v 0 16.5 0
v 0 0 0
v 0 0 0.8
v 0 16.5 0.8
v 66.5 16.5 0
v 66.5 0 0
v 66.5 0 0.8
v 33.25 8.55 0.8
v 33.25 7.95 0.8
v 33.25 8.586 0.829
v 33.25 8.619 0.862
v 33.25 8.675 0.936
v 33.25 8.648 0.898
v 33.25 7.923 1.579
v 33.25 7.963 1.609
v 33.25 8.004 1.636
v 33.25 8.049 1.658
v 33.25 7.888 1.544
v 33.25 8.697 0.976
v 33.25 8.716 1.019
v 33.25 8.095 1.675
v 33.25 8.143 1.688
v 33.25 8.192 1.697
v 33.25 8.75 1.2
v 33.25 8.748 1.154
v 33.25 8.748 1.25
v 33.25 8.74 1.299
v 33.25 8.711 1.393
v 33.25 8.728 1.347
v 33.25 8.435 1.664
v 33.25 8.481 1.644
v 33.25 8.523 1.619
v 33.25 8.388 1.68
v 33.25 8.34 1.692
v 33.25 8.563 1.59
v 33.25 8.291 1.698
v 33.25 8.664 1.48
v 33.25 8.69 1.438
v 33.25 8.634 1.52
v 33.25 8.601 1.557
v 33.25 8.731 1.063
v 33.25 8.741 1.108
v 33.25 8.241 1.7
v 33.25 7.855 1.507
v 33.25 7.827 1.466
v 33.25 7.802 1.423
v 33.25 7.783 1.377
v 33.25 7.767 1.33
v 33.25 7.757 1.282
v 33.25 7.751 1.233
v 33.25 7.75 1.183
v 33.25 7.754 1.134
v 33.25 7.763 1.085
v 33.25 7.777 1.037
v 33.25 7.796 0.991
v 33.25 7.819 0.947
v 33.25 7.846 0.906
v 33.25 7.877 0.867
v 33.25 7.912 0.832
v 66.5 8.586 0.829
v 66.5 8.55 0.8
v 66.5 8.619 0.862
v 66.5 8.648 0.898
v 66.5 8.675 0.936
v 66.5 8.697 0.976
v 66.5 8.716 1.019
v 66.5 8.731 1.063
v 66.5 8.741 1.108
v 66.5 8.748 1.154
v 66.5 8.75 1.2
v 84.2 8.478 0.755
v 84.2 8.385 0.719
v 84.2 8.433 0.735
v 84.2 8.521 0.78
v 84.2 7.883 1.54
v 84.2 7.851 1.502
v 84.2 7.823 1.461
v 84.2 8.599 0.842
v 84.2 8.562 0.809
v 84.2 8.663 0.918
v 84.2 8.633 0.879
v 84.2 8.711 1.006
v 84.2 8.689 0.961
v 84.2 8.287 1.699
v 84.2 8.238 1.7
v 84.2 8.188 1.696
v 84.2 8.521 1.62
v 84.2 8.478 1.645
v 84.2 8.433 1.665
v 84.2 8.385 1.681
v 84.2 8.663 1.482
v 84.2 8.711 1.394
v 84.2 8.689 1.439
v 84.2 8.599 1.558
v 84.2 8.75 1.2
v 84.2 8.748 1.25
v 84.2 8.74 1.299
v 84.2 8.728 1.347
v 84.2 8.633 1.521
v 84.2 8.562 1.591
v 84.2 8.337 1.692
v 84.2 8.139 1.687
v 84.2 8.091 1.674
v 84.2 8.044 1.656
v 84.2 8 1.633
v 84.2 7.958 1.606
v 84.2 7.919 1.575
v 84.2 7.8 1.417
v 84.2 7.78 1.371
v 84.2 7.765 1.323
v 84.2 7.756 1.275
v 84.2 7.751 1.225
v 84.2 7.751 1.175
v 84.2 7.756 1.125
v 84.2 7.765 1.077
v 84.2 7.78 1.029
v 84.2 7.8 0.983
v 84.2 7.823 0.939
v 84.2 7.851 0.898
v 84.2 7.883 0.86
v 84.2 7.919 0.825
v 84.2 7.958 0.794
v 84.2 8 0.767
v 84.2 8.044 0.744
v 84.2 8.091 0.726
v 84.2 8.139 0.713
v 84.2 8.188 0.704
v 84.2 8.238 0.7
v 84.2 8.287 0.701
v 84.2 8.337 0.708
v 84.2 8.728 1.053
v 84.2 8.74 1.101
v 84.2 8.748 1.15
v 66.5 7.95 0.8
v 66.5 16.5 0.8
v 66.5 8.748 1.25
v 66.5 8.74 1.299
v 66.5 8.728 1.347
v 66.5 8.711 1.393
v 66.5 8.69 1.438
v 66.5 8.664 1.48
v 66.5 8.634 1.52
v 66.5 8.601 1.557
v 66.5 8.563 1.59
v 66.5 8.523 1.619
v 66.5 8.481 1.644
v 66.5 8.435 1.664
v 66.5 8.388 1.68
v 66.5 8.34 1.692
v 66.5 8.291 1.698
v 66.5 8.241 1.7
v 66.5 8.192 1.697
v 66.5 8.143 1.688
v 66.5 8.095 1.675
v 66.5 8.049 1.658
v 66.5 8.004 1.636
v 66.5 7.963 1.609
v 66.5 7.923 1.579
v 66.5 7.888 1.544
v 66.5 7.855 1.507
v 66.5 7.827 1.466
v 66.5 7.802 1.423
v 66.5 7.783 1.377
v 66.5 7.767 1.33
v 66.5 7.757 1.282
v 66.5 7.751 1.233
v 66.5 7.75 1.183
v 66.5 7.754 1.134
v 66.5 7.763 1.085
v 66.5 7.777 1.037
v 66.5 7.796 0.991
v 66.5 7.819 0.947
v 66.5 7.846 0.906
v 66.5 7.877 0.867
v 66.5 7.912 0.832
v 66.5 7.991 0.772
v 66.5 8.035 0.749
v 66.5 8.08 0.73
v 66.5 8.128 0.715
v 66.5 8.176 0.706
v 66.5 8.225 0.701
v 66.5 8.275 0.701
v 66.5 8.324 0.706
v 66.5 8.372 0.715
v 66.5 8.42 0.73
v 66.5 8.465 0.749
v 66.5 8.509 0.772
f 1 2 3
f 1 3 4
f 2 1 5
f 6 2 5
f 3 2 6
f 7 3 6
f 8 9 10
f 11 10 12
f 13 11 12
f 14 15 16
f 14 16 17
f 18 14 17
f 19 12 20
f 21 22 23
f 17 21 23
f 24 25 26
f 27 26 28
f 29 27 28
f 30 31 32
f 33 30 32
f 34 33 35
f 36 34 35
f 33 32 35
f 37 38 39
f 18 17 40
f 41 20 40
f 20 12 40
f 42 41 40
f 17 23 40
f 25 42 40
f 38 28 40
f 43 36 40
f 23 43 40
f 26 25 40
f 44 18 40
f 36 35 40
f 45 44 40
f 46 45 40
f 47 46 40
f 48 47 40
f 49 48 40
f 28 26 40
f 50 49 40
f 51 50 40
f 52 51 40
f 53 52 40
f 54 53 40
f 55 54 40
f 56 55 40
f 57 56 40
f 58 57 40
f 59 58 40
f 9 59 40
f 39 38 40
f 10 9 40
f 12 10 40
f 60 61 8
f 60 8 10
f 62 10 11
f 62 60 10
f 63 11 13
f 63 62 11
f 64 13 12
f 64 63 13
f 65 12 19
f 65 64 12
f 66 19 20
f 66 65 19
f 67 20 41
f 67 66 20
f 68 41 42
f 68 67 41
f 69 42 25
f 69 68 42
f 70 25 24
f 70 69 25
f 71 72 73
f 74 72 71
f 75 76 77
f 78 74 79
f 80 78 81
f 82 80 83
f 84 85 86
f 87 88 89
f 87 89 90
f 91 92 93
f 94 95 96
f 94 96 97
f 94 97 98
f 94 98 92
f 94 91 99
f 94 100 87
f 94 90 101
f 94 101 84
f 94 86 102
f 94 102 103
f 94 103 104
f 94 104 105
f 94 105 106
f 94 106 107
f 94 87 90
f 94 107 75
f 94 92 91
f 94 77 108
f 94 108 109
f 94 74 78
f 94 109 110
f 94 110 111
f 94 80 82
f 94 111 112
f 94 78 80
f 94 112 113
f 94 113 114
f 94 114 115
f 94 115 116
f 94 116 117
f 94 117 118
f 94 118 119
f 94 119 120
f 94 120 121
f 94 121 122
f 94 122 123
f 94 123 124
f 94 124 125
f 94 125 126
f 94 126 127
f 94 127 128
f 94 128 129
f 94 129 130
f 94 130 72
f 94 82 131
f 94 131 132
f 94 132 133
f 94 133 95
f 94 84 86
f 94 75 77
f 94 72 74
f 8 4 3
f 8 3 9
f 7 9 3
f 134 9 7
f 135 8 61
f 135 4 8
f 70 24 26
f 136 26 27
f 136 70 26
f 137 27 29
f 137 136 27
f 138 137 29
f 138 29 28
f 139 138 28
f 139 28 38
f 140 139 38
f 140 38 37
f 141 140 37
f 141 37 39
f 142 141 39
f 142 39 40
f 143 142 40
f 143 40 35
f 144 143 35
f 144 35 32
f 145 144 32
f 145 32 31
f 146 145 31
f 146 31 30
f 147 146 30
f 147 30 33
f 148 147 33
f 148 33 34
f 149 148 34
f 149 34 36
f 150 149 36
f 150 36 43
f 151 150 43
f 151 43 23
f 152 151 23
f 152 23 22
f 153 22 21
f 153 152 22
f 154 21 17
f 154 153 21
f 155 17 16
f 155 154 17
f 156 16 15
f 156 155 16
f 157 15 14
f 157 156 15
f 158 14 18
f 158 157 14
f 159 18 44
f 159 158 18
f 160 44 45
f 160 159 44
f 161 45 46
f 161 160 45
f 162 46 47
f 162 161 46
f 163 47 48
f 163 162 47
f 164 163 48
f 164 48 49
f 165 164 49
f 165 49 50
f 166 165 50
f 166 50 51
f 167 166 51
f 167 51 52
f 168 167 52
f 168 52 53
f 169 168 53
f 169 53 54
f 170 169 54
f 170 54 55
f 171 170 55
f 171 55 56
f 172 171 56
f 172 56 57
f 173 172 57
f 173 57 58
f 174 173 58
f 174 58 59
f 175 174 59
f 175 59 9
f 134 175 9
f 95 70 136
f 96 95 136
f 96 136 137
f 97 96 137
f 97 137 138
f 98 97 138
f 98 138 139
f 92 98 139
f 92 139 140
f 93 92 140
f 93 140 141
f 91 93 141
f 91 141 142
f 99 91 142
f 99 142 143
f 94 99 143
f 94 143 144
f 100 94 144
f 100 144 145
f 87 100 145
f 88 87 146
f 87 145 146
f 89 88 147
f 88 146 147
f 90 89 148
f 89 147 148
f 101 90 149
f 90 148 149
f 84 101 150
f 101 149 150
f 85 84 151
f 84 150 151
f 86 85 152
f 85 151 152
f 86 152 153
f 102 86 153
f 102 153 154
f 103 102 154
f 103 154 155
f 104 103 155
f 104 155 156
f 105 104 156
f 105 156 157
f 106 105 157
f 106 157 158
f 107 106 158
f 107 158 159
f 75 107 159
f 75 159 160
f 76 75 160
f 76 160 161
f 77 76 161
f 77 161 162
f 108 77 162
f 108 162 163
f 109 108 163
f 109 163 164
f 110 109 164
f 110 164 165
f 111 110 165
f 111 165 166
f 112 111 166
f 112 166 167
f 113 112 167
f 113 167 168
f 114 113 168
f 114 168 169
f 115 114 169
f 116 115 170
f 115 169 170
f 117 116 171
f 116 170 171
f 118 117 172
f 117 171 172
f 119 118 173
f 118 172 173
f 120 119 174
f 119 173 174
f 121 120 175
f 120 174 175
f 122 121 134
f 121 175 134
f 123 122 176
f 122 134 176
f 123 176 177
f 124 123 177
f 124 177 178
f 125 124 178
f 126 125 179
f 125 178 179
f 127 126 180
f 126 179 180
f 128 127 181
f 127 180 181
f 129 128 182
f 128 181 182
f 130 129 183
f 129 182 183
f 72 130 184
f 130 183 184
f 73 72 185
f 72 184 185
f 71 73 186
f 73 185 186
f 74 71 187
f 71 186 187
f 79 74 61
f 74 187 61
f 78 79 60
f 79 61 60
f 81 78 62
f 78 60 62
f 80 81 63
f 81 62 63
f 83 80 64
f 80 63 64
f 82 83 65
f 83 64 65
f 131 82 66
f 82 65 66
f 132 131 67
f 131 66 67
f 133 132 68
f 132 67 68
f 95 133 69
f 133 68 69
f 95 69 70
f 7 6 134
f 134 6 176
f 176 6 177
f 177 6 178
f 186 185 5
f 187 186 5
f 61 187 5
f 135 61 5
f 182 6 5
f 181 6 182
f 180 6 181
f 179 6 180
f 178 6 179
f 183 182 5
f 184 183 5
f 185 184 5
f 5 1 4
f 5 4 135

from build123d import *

# Parameters (mm, degrees)
F0_W          = 66.5
F0_H          = 16.5
F1_DEPTH      = 0.8
F2_R          = 0.5
F3_DEPTH      = 17.7
F3_DEPTH_BACK = 33.25


with BuildPart() as f1:
    # F0 (on Top) → F1 (new body)
    with BuildSketch(Plane.XY):
        with Locations((33.25, 8.25)):
            Rectangle(F0_W, F0_H)
    extrude(amount=F1_DEPTH)

    # F2 (on face) → F3 (join, two sides)
    with BuildSketch(Plane.YZ.offset(66.5)) as f3_sk:
        with Locations((8.25, 1.2)):
            Circle(F2_R)
    extrude(amount=F3_DEPTH)
    extrude(f3_sk.sketch, amount=-F3_DEPTH_BACK)


solid = f1.part
